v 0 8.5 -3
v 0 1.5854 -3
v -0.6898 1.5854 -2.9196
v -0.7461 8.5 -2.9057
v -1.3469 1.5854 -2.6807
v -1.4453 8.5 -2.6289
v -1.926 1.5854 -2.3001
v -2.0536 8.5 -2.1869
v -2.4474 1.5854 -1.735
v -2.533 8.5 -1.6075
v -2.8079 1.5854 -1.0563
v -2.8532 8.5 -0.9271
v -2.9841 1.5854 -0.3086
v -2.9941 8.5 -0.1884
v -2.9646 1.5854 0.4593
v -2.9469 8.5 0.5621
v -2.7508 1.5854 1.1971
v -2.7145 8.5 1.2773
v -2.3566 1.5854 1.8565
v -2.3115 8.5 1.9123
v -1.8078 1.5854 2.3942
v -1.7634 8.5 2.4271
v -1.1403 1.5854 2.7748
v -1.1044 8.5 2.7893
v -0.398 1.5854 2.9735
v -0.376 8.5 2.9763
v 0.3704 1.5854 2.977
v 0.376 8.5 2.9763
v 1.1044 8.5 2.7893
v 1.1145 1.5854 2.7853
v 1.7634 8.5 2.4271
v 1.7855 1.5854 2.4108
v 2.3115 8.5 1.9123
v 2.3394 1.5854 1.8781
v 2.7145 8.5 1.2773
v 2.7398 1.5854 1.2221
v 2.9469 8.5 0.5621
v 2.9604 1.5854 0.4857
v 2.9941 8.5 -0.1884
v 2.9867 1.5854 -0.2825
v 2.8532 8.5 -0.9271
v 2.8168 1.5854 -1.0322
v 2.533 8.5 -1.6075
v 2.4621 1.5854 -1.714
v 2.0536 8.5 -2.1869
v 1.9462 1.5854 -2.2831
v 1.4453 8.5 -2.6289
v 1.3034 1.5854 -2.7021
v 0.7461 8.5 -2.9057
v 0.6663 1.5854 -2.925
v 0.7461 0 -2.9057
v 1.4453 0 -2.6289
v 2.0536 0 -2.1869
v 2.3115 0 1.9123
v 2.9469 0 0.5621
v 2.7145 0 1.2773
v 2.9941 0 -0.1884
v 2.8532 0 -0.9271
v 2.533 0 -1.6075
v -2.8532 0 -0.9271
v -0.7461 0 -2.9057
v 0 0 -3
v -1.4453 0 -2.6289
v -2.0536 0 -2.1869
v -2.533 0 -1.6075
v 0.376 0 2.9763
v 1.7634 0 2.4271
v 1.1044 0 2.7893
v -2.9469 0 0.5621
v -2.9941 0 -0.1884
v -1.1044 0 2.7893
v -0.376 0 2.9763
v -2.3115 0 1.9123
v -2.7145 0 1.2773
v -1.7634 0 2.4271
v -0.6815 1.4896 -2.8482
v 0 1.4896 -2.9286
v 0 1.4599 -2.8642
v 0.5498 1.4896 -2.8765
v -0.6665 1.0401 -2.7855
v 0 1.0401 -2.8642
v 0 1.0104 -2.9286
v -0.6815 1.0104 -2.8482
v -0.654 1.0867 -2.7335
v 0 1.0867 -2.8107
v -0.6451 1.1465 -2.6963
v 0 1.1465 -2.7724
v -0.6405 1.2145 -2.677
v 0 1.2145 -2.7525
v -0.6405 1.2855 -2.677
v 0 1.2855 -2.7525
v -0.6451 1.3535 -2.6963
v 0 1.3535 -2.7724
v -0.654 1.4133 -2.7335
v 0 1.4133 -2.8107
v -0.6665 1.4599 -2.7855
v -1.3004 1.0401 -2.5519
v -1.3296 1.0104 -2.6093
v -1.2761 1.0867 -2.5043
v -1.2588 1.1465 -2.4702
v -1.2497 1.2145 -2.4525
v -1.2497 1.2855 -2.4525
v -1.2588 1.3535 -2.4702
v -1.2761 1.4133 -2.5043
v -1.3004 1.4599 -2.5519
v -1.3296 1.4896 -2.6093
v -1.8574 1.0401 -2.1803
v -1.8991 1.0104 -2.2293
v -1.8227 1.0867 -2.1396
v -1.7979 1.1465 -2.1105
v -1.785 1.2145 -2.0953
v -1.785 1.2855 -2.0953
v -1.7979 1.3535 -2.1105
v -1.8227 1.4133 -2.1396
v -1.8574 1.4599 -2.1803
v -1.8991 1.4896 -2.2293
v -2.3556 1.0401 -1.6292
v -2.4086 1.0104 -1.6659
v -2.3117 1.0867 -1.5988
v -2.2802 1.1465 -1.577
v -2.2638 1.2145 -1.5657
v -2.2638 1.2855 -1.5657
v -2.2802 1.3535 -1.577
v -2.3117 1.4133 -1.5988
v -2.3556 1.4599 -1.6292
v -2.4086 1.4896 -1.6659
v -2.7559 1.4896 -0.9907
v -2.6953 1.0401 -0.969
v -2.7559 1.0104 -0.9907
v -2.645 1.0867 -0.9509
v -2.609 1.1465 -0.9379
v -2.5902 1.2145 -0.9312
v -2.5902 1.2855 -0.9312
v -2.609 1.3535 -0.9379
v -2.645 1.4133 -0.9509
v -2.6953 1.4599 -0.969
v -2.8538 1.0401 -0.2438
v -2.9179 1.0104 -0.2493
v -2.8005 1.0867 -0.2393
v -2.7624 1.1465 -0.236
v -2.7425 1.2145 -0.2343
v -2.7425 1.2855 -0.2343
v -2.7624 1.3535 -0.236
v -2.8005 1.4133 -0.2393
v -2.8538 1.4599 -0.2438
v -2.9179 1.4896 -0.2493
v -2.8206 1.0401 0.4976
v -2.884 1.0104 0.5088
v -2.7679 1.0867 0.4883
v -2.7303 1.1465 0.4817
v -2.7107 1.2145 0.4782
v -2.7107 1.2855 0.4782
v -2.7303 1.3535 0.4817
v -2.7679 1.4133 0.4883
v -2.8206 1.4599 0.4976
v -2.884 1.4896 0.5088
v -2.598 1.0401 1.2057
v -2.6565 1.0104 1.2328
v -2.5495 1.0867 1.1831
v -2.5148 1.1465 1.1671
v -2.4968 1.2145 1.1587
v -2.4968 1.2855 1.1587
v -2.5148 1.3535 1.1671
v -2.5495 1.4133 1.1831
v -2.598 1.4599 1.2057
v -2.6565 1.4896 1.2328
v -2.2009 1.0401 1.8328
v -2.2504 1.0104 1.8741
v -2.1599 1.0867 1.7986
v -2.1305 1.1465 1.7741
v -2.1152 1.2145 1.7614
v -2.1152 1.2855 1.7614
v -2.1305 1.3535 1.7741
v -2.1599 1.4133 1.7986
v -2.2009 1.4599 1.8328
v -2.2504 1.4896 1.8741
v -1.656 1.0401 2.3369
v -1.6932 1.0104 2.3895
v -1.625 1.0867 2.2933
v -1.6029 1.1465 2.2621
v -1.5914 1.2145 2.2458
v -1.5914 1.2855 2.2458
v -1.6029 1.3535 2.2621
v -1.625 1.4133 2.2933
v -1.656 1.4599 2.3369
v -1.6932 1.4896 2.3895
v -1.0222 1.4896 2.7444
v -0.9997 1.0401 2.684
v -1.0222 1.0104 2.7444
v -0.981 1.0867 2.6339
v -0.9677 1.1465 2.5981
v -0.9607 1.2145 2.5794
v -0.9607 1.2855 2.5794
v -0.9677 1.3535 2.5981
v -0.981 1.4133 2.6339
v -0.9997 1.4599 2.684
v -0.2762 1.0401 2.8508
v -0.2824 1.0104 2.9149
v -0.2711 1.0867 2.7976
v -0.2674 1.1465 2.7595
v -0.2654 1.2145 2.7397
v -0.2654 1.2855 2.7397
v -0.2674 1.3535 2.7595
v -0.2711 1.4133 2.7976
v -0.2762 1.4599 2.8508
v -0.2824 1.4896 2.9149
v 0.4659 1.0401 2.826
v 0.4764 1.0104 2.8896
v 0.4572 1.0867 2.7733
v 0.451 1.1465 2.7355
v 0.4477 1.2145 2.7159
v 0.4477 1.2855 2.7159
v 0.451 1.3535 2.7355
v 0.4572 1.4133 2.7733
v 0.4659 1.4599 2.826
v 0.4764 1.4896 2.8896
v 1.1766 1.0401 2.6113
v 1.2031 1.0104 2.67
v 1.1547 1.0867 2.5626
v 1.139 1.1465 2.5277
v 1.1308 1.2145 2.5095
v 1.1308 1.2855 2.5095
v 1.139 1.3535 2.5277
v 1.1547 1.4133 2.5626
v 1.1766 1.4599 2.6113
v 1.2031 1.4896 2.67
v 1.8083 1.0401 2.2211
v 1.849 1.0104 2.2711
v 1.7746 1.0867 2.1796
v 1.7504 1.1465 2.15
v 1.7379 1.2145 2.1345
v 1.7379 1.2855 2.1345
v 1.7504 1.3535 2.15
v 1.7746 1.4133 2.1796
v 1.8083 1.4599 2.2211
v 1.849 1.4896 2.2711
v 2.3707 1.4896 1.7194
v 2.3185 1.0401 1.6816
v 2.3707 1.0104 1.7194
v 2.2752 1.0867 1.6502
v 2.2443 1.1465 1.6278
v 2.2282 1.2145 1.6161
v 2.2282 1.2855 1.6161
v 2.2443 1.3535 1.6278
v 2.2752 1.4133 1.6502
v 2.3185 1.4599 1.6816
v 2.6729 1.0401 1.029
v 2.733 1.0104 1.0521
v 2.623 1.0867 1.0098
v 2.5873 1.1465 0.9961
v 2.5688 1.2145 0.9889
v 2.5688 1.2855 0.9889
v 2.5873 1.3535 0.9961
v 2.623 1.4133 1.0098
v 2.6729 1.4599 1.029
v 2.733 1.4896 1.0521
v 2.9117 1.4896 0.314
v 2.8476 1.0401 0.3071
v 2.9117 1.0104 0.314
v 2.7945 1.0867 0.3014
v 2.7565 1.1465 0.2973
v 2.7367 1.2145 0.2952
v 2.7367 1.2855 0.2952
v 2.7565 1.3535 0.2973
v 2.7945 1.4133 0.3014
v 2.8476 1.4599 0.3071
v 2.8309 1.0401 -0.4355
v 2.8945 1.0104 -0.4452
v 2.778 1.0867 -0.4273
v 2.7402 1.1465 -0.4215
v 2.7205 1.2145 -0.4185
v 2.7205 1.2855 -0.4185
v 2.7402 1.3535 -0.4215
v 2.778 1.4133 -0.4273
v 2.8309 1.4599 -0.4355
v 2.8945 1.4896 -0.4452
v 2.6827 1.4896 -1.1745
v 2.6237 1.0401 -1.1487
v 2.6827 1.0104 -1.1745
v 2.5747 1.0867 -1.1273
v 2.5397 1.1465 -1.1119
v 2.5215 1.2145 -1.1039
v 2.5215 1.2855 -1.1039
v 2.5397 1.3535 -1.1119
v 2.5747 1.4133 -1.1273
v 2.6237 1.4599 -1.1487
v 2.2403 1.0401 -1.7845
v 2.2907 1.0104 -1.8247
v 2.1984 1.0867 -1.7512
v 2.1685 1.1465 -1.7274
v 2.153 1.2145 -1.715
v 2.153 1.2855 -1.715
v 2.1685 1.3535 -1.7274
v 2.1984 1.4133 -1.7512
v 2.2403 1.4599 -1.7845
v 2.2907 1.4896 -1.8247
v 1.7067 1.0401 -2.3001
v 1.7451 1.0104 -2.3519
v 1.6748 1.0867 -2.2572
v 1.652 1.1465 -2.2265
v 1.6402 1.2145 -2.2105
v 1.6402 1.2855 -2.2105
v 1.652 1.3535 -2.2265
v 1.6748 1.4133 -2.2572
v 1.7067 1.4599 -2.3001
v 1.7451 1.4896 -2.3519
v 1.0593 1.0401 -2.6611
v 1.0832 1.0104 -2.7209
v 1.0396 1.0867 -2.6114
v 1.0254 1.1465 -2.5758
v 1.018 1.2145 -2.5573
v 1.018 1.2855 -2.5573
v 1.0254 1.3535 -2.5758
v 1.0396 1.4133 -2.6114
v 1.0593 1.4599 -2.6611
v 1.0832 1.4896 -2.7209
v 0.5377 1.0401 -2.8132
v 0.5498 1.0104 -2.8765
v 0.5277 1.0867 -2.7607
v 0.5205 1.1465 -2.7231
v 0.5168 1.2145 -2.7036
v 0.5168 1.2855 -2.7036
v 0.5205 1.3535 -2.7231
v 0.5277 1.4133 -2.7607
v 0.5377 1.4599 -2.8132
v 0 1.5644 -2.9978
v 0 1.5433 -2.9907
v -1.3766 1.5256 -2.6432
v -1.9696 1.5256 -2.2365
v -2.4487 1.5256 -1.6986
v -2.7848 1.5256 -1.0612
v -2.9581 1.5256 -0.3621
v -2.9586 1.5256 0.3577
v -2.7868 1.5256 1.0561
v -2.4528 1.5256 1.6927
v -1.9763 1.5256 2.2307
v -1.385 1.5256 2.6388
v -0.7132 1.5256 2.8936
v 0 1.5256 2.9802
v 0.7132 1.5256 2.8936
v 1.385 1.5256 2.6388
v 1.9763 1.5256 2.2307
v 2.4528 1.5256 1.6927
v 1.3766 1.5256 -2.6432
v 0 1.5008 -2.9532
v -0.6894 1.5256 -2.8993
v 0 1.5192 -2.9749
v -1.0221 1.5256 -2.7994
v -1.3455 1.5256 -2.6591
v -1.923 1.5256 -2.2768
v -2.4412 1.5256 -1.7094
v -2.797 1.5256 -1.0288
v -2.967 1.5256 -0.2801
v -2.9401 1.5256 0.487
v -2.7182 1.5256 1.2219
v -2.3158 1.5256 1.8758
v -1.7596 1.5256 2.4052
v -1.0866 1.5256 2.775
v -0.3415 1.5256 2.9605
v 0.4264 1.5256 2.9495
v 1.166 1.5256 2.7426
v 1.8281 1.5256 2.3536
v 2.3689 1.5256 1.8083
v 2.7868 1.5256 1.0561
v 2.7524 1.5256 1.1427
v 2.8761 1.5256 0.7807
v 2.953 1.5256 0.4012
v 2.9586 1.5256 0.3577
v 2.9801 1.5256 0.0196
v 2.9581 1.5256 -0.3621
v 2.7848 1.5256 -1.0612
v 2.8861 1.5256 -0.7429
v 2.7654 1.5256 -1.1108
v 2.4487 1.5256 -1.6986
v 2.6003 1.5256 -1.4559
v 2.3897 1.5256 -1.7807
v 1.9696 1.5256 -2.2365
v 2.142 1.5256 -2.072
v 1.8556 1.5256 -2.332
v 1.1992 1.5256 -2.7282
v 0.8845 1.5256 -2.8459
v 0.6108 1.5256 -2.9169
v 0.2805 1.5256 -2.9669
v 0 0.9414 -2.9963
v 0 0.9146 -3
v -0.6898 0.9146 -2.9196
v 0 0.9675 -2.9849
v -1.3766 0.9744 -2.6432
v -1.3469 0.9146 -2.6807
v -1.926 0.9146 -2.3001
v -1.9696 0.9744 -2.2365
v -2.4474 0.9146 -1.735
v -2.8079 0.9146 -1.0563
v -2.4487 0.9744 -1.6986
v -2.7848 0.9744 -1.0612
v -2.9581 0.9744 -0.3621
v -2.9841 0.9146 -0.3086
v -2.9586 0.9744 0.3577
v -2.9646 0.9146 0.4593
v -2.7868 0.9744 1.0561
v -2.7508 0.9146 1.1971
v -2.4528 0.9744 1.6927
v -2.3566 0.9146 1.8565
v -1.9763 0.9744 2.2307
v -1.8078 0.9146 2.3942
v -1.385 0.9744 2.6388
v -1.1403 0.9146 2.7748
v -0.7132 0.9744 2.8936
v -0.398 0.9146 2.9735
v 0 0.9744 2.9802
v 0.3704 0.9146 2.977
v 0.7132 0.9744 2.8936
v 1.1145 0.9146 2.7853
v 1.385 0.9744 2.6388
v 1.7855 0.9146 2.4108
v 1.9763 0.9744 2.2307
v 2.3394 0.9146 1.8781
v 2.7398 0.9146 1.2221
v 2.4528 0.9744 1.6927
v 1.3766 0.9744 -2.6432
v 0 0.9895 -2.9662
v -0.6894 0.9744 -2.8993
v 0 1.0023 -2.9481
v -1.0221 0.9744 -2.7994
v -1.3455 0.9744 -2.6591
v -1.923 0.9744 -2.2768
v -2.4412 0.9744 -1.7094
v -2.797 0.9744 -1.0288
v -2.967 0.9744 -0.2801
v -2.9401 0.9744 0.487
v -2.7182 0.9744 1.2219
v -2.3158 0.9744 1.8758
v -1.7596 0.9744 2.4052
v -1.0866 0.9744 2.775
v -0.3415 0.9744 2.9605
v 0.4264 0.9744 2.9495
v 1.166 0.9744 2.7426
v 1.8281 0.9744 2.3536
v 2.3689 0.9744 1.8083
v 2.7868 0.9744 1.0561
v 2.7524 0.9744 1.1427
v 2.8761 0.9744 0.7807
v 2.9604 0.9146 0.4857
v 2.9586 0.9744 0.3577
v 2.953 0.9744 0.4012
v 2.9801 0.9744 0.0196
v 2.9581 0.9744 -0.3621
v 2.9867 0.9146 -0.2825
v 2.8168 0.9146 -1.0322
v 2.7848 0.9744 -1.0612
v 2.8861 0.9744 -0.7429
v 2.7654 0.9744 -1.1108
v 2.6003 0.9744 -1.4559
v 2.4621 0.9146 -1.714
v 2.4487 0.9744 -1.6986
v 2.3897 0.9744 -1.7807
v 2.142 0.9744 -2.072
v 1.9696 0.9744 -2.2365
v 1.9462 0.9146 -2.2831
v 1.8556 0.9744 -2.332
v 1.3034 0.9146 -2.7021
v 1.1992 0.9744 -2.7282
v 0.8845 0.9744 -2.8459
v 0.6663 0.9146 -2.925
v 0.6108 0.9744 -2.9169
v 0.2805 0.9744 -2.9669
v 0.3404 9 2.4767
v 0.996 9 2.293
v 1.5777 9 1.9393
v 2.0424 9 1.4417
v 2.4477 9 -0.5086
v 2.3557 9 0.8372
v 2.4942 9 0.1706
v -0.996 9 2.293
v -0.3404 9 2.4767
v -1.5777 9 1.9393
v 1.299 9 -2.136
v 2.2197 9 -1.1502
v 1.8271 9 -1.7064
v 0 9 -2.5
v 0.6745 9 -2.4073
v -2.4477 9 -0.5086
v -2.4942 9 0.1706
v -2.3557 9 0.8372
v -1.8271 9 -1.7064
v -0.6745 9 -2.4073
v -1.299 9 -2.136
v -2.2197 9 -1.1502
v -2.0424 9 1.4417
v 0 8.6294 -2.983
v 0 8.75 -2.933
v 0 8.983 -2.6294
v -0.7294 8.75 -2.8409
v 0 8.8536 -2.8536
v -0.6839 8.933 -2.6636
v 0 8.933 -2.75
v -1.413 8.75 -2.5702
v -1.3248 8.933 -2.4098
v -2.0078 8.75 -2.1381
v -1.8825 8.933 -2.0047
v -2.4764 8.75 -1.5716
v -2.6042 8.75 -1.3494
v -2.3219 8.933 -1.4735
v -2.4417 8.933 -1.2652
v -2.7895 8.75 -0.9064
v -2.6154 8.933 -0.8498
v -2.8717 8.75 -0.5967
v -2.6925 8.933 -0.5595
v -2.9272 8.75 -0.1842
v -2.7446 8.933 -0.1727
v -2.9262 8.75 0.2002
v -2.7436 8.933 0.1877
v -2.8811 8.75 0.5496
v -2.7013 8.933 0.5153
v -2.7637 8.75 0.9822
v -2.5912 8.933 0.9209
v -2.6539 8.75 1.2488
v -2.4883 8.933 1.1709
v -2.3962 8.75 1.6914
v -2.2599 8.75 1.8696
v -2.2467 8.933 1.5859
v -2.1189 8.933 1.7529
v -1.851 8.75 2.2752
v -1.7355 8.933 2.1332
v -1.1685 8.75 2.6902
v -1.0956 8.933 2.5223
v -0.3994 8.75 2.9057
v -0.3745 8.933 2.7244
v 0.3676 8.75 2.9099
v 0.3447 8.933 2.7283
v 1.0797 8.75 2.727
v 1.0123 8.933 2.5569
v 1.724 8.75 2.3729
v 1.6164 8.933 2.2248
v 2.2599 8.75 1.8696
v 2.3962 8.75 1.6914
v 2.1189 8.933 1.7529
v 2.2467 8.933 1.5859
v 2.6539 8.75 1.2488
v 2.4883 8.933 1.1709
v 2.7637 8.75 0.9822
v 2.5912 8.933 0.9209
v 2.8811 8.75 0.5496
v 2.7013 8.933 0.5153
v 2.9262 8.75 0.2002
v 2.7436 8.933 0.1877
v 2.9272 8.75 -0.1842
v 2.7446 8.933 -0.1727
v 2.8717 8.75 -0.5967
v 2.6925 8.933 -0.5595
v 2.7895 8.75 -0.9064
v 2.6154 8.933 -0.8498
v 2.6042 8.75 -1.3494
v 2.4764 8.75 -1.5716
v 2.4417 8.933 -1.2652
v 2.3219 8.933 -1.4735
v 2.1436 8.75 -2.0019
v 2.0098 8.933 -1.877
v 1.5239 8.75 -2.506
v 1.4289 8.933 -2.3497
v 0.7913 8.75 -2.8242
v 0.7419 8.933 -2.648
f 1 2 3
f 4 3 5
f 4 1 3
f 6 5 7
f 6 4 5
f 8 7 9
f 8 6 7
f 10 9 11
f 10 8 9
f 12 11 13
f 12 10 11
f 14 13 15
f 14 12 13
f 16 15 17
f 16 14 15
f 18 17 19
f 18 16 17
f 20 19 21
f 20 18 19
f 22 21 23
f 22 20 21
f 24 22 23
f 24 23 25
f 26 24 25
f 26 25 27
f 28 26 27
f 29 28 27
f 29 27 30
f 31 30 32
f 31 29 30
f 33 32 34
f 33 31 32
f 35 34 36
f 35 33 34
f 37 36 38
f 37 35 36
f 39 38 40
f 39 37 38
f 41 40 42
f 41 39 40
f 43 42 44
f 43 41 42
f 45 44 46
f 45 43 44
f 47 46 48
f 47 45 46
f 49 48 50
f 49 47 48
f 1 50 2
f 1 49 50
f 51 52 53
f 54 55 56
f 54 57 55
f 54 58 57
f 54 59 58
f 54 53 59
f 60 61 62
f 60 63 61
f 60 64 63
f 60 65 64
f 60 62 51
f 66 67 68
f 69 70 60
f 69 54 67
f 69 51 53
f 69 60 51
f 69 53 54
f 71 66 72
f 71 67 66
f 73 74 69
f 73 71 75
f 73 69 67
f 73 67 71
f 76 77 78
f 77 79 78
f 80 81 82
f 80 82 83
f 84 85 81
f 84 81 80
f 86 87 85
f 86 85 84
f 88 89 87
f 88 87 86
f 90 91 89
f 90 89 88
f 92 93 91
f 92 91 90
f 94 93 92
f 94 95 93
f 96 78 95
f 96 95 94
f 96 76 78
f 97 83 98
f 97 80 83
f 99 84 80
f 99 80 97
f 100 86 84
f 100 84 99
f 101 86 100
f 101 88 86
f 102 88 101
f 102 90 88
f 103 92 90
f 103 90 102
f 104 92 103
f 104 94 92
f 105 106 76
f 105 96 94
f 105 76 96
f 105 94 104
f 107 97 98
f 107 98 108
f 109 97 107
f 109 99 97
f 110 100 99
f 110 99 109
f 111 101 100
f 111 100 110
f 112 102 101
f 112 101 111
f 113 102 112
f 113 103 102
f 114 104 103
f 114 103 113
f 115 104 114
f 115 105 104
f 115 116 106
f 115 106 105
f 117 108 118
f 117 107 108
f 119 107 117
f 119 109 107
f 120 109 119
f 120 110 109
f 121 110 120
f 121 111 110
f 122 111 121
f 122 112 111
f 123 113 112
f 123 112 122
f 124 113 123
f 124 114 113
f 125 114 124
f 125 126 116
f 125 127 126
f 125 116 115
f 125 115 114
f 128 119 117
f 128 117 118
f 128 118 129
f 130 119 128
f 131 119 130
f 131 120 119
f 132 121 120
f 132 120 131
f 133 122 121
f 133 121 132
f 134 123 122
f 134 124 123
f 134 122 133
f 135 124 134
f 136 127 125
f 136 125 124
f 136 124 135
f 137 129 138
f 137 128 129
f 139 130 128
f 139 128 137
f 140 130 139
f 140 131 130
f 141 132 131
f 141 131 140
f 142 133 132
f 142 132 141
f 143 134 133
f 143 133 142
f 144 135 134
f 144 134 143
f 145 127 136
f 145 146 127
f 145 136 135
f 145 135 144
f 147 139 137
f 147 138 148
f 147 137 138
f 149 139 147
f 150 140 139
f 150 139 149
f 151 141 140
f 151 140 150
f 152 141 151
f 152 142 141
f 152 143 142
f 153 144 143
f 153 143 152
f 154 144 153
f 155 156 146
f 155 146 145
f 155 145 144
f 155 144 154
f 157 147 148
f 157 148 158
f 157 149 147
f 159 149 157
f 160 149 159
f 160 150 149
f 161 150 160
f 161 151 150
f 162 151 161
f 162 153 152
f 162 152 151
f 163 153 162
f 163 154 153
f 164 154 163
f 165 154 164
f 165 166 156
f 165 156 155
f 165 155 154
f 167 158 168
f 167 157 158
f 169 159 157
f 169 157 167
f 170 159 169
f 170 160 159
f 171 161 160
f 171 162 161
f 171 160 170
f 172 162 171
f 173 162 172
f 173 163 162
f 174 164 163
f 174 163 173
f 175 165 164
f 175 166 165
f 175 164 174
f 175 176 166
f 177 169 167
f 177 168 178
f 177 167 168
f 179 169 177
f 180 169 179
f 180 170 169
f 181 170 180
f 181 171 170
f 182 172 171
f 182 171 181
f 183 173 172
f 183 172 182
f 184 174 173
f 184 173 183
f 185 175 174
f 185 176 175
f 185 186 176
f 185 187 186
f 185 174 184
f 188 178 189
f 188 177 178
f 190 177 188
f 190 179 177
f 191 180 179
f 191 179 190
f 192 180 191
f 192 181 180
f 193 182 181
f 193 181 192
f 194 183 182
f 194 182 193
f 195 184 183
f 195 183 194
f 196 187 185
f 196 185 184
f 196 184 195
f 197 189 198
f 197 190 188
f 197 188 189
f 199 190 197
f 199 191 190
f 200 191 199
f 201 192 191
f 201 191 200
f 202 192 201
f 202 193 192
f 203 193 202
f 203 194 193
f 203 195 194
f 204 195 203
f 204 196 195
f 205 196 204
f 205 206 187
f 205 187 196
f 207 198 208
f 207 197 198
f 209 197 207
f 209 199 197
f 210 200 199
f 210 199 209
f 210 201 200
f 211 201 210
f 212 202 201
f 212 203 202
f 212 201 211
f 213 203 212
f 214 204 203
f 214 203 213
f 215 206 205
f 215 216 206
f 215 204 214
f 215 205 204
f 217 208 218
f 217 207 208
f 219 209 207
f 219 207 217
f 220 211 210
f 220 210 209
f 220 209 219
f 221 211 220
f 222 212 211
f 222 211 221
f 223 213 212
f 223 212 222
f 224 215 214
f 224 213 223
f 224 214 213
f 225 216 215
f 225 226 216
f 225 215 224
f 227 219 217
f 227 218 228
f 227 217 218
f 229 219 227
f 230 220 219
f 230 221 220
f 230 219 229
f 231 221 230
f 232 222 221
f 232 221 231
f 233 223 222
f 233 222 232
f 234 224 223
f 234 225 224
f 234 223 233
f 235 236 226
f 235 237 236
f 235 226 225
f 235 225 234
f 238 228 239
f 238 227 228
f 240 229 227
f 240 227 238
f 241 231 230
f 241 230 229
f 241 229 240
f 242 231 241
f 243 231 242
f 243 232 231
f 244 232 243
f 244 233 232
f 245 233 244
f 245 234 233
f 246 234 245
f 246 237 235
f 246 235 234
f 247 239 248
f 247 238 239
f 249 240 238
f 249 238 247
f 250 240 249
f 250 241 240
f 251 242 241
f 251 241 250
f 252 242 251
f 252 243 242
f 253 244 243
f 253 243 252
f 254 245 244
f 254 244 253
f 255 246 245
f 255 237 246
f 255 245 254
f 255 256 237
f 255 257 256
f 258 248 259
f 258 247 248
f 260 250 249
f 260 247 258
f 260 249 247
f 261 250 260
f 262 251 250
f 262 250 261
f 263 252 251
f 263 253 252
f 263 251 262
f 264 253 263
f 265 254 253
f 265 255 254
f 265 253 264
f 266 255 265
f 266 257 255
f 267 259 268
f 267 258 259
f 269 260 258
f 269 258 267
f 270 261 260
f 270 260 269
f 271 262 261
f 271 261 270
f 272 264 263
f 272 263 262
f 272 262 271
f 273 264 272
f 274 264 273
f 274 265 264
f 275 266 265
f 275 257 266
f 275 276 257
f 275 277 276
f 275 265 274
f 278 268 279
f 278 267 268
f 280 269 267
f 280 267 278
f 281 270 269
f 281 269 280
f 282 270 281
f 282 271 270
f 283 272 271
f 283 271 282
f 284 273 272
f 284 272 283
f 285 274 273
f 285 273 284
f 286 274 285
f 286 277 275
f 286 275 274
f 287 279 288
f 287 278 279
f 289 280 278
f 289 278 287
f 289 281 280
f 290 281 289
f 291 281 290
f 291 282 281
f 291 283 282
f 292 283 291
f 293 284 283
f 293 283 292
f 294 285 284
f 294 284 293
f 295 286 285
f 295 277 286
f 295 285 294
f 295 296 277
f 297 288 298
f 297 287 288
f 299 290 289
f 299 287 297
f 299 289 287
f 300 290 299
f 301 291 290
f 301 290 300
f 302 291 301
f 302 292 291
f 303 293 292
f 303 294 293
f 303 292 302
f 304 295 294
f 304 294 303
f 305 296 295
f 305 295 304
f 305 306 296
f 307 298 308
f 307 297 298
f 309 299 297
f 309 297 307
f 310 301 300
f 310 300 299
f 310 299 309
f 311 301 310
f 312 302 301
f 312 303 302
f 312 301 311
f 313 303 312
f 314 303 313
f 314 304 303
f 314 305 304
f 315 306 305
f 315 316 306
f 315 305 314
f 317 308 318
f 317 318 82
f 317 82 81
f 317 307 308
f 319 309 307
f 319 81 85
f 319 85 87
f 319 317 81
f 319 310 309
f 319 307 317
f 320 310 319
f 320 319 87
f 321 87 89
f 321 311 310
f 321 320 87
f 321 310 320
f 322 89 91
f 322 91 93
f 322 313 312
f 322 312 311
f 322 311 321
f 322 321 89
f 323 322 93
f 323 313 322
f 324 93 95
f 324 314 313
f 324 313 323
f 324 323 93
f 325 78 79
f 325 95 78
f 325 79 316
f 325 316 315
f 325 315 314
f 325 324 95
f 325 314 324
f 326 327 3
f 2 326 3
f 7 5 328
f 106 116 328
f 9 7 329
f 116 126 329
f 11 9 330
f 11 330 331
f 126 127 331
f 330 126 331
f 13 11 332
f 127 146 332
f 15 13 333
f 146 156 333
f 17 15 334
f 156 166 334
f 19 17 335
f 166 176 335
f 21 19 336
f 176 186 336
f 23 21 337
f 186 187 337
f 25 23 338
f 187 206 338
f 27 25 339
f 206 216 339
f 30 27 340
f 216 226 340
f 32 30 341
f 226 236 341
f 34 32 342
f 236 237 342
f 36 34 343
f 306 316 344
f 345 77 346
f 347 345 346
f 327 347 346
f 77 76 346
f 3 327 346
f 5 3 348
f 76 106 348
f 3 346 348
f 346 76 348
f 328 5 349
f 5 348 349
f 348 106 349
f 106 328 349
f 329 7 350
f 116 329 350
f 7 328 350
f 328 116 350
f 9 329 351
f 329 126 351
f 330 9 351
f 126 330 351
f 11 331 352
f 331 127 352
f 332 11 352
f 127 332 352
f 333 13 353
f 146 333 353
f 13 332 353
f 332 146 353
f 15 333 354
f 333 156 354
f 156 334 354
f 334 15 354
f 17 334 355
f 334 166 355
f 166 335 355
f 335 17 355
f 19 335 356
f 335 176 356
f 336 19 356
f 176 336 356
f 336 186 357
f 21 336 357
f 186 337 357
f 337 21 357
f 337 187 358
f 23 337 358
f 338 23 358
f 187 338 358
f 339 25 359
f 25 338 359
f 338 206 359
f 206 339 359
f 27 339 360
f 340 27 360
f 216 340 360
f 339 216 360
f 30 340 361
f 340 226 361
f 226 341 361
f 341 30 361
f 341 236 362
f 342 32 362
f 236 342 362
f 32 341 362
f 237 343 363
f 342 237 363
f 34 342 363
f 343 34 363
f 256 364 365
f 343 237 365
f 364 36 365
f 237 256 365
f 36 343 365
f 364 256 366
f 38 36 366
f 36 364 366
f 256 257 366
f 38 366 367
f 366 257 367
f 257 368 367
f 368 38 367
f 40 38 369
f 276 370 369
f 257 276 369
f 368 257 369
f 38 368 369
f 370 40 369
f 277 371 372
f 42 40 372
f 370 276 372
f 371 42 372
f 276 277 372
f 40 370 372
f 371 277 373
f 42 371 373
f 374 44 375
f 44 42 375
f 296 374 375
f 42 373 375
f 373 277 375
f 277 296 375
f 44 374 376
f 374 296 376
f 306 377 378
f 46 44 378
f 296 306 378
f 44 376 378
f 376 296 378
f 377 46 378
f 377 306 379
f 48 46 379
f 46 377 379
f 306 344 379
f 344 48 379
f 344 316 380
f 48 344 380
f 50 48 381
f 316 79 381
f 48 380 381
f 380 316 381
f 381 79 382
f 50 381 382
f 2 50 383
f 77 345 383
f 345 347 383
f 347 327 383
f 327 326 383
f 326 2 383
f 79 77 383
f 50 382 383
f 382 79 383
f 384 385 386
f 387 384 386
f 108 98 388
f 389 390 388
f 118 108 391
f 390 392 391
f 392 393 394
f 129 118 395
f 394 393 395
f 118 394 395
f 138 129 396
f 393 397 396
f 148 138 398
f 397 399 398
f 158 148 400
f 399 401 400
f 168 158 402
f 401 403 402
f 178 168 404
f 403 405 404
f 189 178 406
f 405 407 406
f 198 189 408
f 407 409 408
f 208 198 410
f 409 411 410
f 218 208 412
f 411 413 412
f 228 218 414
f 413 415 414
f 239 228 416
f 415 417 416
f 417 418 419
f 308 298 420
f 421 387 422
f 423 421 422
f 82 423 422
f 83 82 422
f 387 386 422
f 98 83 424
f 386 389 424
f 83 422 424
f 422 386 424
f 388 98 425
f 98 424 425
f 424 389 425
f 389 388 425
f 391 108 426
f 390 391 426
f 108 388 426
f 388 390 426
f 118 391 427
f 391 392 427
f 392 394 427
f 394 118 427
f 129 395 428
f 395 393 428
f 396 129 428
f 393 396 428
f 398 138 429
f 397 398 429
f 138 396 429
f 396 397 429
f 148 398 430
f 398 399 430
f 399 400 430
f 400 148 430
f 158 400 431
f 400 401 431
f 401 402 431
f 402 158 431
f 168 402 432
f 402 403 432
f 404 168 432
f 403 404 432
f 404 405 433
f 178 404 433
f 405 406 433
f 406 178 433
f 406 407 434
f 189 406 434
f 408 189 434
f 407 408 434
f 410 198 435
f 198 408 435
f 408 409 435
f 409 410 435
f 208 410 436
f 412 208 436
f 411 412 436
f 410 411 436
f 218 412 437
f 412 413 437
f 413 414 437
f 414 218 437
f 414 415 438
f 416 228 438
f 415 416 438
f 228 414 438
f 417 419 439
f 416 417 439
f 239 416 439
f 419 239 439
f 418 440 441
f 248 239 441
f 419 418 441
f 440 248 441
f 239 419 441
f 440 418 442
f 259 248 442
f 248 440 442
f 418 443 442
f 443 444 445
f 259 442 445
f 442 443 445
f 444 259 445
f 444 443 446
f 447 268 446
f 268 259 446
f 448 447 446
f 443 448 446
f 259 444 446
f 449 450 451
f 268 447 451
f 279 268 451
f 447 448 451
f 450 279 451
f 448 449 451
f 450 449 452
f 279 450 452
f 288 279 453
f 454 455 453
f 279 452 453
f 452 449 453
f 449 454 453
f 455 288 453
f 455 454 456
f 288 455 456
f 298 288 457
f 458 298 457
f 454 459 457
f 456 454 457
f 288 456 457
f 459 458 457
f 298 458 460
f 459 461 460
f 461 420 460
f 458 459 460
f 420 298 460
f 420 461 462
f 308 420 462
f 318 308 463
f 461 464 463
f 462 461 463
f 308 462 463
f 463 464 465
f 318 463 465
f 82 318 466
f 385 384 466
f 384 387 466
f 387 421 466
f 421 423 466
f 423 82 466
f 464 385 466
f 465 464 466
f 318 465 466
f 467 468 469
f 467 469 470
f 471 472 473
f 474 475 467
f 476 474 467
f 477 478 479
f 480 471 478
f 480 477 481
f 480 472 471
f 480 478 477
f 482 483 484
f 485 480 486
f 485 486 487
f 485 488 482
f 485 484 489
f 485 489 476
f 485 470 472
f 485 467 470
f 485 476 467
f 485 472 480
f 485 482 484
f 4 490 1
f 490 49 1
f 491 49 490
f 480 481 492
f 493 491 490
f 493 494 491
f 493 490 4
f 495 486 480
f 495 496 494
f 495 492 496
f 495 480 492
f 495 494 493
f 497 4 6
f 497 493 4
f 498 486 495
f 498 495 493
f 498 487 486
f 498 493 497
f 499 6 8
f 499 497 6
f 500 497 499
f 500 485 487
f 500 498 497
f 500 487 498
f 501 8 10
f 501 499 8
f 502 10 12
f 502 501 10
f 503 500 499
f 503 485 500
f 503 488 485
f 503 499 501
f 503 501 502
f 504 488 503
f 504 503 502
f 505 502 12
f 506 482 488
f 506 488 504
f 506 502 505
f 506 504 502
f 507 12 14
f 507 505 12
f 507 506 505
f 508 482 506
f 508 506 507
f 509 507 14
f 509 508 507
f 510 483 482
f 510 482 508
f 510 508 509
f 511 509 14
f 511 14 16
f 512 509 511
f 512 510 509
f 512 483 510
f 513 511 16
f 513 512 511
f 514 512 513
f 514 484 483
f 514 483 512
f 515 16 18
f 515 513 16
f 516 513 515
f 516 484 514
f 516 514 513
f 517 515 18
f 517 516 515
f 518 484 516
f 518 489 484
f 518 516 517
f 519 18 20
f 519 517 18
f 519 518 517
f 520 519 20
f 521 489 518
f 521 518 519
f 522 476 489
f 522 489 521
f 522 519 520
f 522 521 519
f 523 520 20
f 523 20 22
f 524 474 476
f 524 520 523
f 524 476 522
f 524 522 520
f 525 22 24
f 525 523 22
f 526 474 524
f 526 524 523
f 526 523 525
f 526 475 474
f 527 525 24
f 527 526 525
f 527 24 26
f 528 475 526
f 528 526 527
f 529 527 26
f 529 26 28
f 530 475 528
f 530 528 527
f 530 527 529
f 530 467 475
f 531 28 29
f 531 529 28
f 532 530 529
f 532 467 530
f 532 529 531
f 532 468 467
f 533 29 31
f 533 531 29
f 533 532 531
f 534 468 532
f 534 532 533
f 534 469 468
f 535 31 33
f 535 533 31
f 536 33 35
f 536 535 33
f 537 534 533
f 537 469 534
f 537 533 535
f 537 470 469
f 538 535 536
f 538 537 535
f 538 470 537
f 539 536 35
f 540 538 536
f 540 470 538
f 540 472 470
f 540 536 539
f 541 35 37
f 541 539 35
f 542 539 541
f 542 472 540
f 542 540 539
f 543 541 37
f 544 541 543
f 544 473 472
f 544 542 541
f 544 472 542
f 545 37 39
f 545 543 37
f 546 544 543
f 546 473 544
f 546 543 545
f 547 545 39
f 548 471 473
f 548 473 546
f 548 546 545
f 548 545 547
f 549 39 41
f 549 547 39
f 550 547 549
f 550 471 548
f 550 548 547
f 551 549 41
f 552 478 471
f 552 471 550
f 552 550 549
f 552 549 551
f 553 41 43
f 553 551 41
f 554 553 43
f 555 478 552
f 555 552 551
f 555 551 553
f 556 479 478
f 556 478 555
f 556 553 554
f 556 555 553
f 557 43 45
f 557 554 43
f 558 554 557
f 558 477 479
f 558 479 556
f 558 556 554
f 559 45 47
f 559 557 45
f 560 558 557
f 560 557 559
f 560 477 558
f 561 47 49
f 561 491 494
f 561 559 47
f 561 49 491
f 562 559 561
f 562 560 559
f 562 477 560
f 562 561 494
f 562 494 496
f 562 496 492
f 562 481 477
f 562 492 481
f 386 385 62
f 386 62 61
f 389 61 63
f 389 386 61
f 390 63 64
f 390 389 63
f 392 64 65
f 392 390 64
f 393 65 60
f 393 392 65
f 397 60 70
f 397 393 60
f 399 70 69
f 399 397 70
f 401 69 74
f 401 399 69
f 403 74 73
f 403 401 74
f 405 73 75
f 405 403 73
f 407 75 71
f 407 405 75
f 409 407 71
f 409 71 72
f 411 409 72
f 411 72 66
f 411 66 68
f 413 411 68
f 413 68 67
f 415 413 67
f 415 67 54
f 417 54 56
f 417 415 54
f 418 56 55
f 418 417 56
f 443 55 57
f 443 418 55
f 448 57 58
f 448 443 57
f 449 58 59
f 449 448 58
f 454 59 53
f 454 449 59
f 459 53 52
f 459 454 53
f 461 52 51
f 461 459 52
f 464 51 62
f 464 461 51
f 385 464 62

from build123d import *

# Parameters (mm, degrees)
FILLET1_R = 0.1


with BuildPart() as part:
    # Sketch1 → Revolve1 (revolve)
    with BuildSketch(Plane.XY, mode=Mode.PRIVATE) as revolve1_sk:
        with BuildLine():
            Line((0, 0), (3, 0))
            Line((3, 0), (3, 1))
            ThreePointArc((3, 1), (2.75, 1.25), (3, 1.5))
            Line((3, 1.5), (3, 8.5))
            ThreePointArc((3, 8.5), (2.853553391, 8.853553391), (2.5, 9))
            Line((2.5, 9), (0, 9))
            Line((0, 9), (0, 0))
        make_face()
    revolve(revolve1_sk.sketch.rotate(Axis((0, -5.130376558, 0), (0, 1, 0)), 90), axis=Axis((0, -5.130376558, 0), (0, 1, 0)))

    # Fillet1
    fillet1_edges = [part.edges().sort_by_distance(p)[0] for p in [
        (0, 1.5, 3),
        (0, 1, 3),
    ]]
    fillet(fillet1_edges, radius=FILLET1_R)


solid = part.part
